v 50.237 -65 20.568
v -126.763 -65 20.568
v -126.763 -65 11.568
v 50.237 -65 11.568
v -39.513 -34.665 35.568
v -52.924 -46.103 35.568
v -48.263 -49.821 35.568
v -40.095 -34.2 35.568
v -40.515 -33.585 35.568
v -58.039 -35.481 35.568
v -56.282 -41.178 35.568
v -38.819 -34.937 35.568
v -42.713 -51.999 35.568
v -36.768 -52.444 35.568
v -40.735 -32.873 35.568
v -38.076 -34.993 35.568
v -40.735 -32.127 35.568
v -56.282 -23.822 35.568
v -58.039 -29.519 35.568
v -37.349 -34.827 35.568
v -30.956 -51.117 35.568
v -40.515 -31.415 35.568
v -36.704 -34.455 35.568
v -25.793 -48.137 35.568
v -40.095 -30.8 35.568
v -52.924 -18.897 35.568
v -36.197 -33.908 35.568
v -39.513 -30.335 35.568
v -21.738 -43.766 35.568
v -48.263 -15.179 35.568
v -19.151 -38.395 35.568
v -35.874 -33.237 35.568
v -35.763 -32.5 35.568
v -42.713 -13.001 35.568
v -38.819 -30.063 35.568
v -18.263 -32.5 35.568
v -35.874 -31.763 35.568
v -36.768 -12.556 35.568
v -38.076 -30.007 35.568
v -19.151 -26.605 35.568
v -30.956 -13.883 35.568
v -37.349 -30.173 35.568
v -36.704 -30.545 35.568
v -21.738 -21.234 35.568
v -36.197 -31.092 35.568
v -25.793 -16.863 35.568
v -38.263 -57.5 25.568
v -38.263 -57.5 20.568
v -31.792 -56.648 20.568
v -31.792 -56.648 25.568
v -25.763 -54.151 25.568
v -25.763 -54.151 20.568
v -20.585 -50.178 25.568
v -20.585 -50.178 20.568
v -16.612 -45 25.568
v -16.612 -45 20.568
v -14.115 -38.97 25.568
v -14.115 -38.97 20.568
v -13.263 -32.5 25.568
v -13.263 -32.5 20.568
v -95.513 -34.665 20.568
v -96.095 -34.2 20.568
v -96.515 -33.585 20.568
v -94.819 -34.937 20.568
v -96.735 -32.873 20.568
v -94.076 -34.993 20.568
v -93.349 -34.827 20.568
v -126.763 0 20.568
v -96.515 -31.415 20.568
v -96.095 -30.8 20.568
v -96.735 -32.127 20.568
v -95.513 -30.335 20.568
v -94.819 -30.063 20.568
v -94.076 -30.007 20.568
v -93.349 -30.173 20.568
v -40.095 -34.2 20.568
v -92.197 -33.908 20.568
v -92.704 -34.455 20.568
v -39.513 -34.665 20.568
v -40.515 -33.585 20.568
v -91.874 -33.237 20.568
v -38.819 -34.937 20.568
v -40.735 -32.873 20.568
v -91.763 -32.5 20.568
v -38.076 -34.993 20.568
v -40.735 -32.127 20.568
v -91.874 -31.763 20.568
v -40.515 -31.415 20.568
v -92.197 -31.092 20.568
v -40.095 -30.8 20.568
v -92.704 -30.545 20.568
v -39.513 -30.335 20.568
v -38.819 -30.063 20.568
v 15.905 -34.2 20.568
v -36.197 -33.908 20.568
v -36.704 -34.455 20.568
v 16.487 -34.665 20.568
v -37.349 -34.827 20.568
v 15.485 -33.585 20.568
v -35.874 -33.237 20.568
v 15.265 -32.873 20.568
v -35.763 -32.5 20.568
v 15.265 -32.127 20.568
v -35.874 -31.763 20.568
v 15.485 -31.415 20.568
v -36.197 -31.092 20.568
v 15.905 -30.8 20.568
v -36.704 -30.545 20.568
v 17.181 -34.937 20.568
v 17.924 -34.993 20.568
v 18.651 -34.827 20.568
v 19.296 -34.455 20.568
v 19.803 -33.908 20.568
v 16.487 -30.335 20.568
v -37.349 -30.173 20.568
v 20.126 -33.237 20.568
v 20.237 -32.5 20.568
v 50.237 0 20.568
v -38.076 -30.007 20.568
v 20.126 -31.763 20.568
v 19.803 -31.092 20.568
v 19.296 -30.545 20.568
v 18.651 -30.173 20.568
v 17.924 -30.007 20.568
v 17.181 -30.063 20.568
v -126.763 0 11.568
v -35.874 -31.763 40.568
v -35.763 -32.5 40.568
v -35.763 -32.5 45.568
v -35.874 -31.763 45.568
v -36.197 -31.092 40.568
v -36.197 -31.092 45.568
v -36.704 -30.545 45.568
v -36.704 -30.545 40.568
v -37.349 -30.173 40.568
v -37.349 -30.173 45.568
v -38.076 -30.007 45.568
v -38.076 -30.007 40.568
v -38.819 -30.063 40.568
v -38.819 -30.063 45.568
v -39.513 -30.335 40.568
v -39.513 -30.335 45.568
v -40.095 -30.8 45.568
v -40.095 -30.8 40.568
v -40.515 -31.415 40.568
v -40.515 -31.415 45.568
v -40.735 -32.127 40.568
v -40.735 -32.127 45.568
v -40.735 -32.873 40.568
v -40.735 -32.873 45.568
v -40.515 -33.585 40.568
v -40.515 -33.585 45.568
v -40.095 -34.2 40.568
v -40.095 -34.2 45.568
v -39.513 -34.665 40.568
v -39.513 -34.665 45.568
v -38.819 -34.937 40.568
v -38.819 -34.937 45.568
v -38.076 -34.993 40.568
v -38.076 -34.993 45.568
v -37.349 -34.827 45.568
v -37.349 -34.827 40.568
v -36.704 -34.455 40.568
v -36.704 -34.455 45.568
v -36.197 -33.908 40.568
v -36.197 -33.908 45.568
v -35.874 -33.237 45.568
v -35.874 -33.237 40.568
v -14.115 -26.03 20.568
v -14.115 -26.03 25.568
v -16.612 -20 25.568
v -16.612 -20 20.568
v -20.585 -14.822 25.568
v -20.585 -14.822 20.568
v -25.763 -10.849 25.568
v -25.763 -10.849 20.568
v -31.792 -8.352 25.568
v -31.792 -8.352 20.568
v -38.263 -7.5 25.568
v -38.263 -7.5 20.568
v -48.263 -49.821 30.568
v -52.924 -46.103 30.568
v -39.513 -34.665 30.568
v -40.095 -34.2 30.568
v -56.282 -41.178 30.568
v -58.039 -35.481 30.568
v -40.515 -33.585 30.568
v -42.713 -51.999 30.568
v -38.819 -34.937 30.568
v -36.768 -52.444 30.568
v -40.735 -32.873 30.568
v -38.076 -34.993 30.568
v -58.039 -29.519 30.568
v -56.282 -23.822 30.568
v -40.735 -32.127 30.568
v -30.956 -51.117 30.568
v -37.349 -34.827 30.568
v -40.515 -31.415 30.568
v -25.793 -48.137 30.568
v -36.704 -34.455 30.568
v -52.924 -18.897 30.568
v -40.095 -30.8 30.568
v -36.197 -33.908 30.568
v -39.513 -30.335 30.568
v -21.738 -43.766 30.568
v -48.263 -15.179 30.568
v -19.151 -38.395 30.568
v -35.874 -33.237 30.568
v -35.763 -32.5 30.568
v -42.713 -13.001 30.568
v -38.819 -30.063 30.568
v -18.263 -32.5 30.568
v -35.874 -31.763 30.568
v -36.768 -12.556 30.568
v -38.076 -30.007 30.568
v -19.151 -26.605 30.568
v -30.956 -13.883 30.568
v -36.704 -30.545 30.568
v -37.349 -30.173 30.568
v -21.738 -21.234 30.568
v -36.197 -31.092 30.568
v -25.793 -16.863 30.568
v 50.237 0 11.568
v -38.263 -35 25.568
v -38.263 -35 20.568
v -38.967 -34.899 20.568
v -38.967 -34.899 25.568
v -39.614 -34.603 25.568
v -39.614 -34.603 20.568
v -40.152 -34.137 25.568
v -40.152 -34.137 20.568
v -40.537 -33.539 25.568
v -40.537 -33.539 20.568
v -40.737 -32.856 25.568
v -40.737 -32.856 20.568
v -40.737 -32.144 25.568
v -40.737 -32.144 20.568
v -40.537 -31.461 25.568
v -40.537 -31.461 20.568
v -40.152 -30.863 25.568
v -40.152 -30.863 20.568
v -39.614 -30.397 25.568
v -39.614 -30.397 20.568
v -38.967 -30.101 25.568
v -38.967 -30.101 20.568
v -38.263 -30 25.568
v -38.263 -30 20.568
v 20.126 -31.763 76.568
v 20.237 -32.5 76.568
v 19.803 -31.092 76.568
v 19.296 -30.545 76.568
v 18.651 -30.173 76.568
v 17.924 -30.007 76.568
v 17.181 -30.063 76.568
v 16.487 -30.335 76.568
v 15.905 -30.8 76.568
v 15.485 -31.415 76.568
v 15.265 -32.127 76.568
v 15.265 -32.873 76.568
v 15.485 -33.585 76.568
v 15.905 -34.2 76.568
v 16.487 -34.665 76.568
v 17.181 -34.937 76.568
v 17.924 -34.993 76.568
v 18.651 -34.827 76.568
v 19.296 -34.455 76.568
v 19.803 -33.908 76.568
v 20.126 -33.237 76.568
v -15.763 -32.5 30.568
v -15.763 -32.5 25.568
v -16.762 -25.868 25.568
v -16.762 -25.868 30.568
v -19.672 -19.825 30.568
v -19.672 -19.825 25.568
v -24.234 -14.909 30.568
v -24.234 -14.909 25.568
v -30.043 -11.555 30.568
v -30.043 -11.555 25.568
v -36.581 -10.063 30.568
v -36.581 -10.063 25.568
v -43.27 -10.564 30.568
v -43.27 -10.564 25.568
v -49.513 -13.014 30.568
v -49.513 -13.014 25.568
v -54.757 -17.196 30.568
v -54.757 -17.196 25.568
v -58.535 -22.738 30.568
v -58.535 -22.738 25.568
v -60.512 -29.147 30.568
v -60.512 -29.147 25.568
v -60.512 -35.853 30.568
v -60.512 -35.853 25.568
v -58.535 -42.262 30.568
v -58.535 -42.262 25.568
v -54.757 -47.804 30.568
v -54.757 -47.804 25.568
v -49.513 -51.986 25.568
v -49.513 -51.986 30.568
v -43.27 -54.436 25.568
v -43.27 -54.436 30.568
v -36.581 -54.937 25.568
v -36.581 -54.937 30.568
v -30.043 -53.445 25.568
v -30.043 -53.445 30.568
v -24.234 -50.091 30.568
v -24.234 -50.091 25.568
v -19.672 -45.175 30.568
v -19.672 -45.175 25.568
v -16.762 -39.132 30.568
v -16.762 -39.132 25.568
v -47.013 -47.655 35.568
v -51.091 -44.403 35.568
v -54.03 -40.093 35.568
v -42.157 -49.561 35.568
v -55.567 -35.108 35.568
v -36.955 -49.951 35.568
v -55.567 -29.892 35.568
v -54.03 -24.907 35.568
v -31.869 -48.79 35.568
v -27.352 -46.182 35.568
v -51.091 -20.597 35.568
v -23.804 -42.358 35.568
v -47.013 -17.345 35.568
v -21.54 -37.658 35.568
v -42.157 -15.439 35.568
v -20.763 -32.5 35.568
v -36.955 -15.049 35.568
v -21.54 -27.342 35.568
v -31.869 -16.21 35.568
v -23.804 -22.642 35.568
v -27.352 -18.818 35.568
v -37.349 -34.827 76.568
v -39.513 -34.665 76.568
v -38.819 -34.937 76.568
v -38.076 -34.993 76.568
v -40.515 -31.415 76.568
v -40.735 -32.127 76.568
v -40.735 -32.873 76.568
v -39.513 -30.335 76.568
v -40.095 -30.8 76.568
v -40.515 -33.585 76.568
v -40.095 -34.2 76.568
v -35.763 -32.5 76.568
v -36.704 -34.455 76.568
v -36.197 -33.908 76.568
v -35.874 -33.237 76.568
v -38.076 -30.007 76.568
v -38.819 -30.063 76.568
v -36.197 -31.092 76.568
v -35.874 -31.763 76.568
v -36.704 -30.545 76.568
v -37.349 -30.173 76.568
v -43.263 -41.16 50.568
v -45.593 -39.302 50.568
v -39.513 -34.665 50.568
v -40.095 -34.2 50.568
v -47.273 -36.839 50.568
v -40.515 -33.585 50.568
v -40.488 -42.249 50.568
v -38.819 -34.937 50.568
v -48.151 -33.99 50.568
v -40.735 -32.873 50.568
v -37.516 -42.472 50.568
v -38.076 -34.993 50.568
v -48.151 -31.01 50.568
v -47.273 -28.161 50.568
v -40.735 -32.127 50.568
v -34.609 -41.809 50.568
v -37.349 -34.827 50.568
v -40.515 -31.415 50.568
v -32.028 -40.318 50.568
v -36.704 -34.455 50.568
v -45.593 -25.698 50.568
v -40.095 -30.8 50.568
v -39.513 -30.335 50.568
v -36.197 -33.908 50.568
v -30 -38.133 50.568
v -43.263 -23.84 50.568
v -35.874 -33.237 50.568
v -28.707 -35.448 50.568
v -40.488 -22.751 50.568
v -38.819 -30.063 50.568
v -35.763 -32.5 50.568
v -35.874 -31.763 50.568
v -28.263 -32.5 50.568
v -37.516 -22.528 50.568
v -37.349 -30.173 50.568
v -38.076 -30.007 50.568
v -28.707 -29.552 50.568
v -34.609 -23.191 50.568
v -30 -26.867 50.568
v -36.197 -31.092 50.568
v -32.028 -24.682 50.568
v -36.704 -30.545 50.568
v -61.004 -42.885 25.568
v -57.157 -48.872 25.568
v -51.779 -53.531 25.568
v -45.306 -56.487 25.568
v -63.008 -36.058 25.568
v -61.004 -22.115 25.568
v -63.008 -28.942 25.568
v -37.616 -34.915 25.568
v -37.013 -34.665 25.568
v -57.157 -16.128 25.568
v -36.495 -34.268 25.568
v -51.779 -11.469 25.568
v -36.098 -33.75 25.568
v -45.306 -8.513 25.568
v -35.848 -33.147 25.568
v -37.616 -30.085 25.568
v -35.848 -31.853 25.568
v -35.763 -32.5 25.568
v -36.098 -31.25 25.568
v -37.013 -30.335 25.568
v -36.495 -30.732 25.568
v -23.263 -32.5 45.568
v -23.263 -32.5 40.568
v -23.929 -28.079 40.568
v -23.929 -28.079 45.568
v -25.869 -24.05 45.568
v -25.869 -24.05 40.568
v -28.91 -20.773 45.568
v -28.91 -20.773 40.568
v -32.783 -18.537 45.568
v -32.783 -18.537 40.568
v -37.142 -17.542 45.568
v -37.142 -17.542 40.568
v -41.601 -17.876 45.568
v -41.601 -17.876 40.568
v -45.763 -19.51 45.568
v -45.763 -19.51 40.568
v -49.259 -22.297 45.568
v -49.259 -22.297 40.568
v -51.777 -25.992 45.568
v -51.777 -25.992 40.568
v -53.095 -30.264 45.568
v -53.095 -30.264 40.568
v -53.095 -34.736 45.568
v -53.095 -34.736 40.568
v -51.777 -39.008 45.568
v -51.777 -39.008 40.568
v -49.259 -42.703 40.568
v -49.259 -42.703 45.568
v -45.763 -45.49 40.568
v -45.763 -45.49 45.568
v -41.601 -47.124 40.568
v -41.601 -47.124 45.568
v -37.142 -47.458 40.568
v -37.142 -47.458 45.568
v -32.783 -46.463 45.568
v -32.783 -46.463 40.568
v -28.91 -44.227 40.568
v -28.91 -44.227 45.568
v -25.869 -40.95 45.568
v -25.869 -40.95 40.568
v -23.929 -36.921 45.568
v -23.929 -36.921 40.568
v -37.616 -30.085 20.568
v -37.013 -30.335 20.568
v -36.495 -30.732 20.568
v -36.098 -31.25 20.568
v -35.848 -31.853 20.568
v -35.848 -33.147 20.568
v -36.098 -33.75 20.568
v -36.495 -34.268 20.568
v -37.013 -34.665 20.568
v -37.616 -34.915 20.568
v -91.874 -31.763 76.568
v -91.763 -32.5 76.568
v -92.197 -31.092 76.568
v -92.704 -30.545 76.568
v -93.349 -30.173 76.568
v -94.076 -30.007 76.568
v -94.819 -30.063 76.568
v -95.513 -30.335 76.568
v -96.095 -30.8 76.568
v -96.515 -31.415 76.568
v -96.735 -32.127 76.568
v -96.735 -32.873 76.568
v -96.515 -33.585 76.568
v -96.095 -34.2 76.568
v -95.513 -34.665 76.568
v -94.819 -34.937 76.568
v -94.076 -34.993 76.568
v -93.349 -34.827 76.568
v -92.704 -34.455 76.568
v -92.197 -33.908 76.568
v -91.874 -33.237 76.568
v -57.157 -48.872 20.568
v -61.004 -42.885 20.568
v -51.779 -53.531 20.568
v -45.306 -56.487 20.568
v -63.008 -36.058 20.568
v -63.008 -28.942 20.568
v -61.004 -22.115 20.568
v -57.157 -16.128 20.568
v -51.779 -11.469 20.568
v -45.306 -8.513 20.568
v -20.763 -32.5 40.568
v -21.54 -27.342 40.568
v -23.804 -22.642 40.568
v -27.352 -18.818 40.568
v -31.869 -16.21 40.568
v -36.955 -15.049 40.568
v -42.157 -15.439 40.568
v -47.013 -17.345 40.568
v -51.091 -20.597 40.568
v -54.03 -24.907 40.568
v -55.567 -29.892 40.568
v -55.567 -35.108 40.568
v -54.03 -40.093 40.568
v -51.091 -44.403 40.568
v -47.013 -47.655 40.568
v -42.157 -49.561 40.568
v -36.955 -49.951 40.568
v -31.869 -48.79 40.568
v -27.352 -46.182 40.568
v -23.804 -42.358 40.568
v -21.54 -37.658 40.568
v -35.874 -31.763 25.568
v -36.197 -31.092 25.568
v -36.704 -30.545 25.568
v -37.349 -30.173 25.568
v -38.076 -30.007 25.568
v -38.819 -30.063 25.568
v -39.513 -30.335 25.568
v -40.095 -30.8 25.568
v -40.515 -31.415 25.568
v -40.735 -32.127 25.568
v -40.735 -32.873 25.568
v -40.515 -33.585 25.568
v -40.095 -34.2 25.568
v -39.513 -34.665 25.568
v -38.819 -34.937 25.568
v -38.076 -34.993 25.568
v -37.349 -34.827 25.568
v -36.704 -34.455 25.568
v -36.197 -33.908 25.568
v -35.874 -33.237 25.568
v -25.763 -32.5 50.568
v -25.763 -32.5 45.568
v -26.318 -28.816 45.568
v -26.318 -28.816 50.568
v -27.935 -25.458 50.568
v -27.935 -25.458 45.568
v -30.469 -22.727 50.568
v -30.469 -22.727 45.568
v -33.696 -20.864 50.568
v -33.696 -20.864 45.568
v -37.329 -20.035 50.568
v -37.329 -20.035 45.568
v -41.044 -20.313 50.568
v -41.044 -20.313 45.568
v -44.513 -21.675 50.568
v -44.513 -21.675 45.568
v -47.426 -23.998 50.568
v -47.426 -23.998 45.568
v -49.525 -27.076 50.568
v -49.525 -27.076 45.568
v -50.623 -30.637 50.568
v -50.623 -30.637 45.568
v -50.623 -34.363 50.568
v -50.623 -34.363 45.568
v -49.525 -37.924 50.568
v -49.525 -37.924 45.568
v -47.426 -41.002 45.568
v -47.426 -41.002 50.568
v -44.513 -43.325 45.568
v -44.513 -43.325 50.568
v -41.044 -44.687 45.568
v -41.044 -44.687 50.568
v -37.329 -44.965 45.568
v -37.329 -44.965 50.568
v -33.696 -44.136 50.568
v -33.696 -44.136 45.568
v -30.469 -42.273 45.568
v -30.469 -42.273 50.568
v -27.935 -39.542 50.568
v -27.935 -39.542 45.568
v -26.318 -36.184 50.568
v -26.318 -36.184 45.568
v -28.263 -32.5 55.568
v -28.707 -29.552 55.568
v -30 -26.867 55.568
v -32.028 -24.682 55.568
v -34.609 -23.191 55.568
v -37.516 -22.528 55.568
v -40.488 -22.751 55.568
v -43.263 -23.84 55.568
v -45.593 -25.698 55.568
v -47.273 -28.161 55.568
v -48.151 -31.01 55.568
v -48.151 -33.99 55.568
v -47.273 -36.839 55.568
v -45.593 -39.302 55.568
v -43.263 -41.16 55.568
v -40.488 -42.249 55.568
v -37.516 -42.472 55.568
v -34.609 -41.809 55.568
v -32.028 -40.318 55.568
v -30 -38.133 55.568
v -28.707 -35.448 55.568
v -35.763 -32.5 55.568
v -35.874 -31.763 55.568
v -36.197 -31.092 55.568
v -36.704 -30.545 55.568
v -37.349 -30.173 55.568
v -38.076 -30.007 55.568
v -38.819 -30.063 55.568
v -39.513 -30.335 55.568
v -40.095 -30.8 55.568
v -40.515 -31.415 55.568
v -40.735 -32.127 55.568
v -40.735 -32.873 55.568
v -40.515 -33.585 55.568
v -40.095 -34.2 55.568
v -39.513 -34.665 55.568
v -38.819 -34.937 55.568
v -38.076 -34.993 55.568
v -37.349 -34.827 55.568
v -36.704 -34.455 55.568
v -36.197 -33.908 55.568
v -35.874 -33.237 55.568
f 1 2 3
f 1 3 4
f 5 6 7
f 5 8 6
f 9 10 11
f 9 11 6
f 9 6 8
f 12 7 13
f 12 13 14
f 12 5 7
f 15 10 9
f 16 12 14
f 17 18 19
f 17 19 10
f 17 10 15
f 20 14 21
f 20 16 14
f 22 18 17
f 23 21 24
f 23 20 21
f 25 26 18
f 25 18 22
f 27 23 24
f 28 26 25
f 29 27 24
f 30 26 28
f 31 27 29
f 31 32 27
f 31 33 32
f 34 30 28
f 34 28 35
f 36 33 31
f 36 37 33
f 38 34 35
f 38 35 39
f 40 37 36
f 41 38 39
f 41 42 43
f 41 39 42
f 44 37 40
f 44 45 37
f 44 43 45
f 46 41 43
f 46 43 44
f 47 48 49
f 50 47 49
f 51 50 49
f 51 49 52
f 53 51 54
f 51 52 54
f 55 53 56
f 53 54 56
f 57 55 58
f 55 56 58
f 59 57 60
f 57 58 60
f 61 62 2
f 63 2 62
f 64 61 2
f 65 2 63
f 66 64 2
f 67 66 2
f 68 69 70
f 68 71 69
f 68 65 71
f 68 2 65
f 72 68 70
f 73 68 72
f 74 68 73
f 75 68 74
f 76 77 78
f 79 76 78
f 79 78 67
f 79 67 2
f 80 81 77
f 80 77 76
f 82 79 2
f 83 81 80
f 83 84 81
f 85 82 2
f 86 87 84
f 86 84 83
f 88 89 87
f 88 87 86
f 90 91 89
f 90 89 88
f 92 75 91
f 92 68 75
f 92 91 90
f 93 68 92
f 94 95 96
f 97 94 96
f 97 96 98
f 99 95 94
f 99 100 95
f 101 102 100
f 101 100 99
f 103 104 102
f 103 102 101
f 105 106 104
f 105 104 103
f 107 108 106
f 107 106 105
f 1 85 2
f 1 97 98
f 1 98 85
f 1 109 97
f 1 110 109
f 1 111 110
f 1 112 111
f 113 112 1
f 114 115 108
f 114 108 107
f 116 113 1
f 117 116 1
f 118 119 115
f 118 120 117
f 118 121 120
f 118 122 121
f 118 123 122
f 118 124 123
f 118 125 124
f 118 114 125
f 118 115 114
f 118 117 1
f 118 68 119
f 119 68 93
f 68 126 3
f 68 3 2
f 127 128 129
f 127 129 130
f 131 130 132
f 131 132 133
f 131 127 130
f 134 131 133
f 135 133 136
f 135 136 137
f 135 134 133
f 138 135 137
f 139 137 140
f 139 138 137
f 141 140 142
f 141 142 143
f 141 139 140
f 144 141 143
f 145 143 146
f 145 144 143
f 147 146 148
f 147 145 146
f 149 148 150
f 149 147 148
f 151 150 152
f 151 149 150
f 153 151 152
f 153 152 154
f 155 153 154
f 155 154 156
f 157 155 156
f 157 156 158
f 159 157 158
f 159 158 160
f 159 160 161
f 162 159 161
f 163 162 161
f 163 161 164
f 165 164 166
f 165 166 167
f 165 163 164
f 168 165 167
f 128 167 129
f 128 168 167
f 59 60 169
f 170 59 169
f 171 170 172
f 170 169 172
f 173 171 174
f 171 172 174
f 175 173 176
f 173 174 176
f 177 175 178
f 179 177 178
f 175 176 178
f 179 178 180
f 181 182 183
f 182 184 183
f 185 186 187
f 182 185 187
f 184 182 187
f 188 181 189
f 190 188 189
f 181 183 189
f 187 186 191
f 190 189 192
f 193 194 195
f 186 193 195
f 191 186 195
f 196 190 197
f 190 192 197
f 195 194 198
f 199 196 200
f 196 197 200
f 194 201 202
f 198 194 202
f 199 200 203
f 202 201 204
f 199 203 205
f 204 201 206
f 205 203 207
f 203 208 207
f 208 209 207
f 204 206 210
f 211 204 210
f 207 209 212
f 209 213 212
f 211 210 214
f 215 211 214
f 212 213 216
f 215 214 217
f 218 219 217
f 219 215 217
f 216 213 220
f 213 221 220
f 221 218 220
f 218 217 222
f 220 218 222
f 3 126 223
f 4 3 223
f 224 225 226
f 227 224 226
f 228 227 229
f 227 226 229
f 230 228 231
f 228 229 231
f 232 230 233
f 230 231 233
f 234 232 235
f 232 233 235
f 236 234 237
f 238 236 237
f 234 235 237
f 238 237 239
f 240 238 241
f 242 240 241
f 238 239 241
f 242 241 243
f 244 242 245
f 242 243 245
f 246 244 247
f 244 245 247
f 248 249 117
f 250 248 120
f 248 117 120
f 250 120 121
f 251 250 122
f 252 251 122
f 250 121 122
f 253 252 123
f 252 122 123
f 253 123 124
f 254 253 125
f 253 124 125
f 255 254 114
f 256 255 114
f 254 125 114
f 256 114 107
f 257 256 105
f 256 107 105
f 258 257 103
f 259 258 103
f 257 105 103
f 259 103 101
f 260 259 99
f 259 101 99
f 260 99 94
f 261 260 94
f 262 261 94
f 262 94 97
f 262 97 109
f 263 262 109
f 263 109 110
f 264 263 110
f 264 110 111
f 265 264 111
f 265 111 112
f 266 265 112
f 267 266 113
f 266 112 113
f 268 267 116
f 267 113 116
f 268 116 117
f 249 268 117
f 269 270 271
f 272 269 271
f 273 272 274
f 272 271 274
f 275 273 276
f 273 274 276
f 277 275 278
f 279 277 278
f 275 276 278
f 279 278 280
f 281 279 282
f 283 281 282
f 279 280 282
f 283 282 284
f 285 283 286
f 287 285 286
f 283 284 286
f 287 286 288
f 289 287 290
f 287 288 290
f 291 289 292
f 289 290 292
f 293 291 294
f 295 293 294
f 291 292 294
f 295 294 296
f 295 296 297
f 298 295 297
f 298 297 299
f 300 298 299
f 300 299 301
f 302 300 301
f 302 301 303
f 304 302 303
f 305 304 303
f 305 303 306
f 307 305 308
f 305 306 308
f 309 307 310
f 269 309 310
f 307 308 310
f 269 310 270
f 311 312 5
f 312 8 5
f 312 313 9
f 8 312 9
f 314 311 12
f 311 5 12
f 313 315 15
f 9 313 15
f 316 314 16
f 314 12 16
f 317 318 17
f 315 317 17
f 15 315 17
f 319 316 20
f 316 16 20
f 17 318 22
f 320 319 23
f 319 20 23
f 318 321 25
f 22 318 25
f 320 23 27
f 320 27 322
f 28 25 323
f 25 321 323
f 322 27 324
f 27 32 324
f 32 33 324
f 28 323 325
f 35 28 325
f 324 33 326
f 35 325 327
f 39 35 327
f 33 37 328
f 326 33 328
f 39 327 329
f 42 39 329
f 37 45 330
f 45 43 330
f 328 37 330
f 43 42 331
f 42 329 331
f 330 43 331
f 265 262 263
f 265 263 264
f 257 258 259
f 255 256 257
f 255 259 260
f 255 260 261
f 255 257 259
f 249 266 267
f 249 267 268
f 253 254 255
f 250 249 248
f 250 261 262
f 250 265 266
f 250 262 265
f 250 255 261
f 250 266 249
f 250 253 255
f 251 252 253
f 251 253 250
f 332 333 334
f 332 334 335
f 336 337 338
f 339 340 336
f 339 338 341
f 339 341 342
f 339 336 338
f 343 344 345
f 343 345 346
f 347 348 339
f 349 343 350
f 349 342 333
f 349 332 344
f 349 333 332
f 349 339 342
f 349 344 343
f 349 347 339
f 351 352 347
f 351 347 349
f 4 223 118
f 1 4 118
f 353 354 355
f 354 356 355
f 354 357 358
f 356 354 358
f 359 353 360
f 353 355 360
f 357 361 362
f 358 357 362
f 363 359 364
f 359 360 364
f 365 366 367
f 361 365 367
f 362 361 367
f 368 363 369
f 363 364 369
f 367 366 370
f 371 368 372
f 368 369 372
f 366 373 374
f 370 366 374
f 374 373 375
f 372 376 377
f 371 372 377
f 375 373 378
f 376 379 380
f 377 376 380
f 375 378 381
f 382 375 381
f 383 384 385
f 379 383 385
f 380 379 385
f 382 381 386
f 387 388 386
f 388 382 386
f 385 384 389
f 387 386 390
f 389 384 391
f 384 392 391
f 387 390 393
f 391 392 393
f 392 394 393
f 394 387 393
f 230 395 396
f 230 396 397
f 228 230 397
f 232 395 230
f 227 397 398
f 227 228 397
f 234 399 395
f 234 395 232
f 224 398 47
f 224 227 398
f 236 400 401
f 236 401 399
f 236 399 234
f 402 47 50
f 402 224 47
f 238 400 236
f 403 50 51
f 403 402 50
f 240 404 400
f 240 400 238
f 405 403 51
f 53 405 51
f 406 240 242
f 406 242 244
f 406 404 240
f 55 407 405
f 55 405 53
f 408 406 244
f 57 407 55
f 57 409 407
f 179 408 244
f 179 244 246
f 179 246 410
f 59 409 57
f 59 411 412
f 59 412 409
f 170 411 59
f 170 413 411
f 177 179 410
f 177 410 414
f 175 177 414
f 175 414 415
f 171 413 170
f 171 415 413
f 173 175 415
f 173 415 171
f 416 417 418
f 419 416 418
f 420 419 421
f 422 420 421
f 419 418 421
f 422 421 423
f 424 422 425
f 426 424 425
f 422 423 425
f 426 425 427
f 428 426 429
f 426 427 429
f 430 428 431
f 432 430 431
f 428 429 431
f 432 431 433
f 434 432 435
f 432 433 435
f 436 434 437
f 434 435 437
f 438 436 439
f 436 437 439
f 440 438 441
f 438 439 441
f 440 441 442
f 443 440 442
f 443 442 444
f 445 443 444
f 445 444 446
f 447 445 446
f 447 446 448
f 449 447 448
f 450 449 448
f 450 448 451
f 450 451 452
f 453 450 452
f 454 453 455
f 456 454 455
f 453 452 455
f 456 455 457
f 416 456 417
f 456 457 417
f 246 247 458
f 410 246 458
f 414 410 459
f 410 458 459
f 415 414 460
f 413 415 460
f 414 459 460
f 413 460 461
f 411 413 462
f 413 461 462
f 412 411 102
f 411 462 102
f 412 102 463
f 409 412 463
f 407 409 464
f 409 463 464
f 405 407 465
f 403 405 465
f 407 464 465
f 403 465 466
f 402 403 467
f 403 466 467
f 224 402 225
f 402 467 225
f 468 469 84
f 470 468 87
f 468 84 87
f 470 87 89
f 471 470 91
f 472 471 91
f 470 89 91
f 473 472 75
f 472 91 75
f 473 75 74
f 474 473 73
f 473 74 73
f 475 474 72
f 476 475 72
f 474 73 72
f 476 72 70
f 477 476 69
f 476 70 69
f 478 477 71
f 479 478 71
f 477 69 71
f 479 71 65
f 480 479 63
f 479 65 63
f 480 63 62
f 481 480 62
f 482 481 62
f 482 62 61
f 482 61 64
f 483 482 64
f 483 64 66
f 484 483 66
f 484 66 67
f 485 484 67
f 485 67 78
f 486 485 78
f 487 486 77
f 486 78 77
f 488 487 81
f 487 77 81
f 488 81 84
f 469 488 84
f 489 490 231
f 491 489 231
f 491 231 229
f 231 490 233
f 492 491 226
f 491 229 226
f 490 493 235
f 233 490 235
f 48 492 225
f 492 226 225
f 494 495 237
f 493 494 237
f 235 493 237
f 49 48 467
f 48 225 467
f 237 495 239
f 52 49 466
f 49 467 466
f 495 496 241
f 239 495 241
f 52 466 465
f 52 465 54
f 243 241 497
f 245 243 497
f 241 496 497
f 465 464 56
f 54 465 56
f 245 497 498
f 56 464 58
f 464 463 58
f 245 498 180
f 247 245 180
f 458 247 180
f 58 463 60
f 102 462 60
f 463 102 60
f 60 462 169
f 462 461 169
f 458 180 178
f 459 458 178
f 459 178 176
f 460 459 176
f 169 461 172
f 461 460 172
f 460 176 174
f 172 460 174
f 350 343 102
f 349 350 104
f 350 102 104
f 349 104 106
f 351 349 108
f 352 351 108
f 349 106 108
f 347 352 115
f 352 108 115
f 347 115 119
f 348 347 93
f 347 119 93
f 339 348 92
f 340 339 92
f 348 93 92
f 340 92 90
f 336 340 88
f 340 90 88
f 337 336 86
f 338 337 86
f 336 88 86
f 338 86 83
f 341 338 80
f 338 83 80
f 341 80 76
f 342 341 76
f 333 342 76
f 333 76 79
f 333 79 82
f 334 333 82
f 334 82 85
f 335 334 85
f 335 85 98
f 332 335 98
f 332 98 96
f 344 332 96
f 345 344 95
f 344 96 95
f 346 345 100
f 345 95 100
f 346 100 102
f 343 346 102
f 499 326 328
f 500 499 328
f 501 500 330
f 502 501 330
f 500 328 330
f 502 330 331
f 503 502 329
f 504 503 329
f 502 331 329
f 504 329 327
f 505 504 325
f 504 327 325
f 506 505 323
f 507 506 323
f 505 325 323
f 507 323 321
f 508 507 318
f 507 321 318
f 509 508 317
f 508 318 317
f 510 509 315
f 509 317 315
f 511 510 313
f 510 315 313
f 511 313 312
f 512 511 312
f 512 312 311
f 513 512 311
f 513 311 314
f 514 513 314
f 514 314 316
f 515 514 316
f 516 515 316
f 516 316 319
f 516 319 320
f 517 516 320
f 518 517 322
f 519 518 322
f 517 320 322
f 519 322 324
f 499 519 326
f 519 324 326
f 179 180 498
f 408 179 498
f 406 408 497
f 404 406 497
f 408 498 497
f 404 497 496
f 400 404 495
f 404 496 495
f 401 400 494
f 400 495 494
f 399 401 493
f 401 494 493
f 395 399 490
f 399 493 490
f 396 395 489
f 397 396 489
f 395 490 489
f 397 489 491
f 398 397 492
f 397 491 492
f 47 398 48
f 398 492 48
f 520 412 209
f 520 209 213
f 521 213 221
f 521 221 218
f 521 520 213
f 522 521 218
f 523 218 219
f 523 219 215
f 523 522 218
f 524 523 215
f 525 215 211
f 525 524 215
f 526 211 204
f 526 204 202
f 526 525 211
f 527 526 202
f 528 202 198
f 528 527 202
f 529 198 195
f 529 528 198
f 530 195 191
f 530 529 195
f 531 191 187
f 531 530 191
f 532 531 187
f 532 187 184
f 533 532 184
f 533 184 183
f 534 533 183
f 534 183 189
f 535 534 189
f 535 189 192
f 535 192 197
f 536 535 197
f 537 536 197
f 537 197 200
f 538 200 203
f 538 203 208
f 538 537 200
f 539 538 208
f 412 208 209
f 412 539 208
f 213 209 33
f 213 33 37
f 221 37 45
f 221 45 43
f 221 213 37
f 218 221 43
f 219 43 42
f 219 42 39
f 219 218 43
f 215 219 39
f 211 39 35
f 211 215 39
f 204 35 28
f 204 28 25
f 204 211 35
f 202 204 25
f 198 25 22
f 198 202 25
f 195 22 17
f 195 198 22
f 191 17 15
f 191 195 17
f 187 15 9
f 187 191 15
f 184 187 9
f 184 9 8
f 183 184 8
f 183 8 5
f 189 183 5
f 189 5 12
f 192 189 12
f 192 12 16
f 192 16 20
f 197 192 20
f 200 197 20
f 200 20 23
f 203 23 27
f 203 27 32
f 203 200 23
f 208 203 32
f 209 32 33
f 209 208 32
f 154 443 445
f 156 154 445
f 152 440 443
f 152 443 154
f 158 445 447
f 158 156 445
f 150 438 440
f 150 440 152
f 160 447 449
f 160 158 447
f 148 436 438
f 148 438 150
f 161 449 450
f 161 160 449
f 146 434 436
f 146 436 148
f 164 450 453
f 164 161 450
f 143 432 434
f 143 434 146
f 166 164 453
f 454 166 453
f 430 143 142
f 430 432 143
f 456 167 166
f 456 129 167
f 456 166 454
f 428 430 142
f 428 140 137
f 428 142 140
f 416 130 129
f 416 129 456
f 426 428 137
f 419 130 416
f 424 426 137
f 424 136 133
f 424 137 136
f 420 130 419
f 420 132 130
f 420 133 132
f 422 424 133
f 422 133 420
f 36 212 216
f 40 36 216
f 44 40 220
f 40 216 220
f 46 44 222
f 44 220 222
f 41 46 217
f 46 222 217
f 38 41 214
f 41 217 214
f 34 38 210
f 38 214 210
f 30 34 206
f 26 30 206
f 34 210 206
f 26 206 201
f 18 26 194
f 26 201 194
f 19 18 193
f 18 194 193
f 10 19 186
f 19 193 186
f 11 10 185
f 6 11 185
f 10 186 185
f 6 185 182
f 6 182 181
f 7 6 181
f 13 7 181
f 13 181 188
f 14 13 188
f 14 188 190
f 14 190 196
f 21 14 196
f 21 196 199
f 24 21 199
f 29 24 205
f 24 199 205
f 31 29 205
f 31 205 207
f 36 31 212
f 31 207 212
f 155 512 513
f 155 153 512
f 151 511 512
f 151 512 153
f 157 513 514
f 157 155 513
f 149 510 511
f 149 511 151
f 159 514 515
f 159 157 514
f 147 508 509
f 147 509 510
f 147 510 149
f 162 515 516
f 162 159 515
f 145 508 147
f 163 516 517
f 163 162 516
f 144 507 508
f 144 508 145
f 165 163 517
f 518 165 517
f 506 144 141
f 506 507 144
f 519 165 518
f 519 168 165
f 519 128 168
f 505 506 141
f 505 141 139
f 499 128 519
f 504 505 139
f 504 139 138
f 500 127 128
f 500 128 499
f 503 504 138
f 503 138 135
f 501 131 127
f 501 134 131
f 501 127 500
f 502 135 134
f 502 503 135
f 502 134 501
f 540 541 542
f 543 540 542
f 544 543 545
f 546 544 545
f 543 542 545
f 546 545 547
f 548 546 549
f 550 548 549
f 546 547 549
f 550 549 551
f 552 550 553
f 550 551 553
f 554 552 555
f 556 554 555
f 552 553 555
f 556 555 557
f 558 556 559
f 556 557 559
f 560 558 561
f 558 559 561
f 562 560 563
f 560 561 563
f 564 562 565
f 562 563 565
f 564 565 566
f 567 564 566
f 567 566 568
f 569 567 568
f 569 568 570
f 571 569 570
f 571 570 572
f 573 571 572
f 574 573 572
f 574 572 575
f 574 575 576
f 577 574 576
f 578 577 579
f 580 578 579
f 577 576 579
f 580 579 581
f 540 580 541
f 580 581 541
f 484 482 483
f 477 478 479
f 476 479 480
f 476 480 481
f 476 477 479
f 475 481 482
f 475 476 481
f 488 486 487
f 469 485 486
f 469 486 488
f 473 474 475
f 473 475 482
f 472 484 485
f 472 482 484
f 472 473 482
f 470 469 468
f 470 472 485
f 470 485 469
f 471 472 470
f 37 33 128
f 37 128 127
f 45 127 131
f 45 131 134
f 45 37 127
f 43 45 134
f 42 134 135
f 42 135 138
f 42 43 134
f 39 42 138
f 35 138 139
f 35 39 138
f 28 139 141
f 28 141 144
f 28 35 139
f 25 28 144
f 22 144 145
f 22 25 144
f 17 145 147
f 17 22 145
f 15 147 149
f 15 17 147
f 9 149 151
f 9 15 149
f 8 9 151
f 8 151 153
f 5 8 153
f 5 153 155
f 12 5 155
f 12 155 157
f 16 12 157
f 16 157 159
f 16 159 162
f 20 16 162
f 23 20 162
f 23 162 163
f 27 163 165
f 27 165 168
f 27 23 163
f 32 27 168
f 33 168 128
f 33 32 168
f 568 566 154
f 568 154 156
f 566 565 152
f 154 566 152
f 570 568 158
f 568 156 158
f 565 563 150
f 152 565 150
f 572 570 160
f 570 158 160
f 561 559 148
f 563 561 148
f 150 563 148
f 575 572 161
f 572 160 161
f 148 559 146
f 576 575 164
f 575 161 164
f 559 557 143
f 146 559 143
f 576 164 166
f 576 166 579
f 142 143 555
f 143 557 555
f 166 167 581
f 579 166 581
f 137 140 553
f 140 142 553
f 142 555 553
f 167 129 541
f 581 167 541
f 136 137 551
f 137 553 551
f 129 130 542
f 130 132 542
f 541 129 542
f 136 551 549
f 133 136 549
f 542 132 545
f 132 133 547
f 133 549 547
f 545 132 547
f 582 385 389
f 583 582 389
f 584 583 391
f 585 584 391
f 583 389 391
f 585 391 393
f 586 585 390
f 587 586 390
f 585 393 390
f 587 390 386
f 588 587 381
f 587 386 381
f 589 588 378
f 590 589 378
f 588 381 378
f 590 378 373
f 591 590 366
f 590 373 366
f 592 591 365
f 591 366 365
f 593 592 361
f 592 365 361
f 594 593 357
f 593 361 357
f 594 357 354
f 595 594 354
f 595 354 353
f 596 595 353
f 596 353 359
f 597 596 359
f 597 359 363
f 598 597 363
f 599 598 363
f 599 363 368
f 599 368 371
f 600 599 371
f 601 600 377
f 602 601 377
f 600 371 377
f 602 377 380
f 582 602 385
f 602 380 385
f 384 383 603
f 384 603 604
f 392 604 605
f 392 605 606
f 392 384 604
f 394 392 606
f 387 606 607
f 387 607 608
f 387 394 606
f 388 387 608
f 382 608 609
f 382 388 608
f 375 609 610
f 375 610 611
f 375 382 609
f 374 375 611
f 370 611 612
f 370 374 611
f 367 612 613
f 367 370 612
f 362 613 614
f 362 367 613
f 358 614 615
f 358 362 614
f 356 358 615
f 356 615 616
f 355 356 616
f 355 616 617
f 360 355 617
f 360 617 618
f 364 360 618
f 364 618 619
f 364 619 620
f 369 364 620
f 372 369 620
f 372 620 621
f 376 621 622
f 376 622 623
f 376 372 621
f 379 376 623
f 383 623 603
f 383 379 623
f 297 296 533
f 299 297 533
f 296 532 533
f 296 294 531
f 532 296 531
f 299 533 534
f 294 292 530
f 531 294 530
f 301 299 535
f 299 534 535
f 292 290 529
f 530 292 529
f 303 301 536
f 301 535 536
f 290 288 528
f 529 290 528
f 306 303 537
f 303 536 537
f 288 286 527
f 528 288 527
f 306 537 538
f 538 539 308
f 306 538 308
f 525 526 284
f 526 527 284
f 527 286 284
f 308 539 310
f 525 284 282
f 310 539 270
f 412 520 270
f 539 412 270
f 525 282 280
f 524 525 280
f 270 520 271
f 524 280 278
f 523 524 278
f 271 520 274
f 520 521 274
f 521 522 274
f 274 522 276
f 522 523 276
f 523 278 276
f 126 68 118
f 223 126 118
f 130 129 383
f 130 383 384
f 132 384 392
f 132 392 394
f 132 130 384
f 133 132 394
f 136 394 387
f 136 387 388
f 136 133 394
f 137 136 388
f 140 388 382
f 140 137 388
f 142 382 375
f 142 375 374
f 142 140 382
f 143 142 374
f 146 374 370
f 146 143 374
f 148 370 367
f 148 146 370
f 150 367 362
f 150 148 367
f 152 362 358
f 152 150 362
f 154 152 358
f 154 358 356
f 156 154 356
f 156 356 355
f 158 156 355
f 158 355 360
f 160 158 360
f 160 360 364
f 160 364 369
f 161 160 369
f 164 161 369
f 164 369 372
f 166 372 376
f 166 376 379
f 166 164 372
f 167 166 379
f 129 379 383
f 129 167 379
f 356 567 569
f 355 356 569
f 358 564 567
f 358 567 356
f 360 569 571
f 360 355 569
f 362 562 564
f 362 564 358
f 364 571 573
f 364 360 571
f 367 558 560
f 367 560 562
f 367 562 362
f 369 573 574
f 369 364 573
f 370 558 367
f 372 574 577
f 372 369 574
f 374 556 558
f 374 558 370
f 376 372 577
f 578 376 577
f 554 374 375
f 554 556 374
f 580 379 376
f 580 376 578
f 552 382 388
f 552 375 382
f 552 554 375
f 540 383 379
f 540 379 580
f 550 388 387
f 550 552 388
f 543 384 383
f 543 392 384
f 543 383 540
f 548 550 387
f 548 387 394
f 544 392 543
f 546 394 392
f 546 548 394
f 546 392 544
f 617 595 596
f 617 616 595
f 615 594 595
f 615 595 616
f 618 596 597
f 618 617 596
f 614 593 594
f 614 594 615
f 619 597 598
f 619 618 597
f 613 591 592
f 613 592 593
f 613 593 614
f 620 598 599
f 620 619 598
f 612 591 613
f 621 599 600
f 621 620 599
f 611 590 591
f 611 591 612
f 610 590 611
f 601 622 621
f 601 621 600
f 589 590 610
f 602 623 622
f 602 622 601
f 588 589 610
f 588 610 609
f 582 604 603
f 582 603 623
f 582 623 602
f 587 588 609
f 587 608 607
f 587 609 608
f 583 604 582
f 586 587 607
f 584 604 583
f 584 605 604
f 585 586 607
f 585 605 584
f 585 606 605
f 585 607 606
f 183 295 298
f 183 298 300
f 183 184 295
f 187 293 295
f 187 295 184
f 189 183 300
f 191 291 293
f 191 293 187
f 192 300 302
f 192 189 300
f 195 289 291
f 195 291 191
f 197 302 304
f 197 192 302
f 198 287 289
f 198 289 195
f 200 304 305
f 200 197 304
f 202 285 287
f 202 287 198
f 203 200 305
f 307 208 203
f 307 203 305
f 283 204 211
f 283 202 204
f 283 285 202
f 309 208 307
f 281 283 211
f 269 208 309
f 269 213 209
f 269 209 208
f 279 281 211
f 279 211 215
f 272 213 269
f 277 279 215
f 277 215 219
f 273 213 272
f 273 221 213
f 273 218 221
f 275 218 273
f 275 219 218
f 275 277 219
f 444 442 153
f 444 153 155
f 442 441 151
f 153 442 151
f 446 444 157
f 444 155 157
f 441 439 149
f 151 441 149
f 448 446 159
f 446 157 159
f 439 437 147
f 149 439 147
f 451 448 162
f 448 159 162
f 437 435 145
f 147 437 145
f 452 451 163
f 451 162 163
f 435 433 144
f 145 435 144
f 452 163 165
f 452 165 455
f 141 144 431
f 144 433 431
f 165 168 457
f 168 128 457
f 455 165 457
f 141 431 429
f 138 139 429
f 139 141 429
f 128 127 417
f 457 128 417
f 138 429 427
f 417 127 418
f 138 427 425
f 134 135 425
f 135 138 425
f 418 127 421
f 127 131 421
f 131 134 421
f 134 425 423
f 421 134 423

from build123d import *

# Parameters (mm, degrees)
F0_W      = 177
F0_H      = 9
F1_DEPTH  = 65
F3_DEPTH  = 56
F5_DEPTH  = 5
F6_R      = 22.5
F6_R_2    = 2.5
F7_DEPTH  = 5
F8_R      = 20
F8_R_2    = 2.5
F9_DEPTH  = 5
F10_R     = 17.5
F10_R_2   = 2.5
F11_DEPTH = 5
F12_R     = 15
F12_R_2   = 2.5
F13_DEPTH = 5
F14_R     = 12.5
F14_R_2   = 2.5
F15_DEPTH = 5
F16_R     = 10
F16_R_2   = 2.5
F17_DEPTH = 5


with BuildPart() as f1:
    # F0 (on Front) → F1 (new body)
    with BuildSketch(Plane.XZ):
        with Locations((-38.2628371716, 16.0677108988)):
            Rectangle(F0_W, F0_H)
    extrude(amount=F1_DEPTH)

    # F2 (on face) → F3 (join)
    with BuildSketch(Plane.XY.offset(20.5677108988)):
        with BuildLine():
            ThreePointArc((15.2371628284, -32.5), (17.7371628284, -35), (20.2371628284, -32.5))
            Line((20.2371628284, -32.5), (17.7371628284, -32.5))
            Line((17.7371628284, -32.5), (15.2371628284, -32.5))
        make_face()
        with BuildLine():
            Line((17.7371628284, -32.5), (20.2371628284, -32.5))
            ThreePointArc((20.2371628284, -32.5), (17.7371628284, -30), (15.2371628284, -32.5))
            Line((15.2371628284, -32.5), (17.7371628284, -32.5))
        make_face()
        with BuildLine():
            Line((-35.7628371716, -32.5), (-38.2628371716, -32.5))
            Line((-38.2628371716, -32.5), (-40.7628371716, -32.5))
            ThreePointArc((-40.7628371716, -32.5), (-38.2628371716, -35), (-35.7628371716, -32.5))
        make_face()
        with BuildLine():
            Line((-40.7628371716, -32.5), (-38.2628371716, -32.5))
            Line((-38.2628371716, -32.5), (-35.7628371716, -32.5))
            ThreePointArc((-35.7628371716, -32.5), (-38.2628371716, -30), (-40.7628371716, -32.5))
        make_face()
        with BuildLine():
            Line((-91.7628371716, -32.5), (-94.2628371716, -32.5))
            Line((-94.2628371716, -32.5), (-96.7628371716, -32.5))
            ThreePointArc((-96.7628371716, -32.5), (-94.2628371716, -35), (-91.7628371716, -32.5))
        make_face()
        with BuildLine():
            Line((-96.7628371716, -32.5), (-94.2628371716, -32.5))
            Line((-94.2628371716, -32.5), (-91.7628371716, -32.5))
            ThreePointArc((-91.7628371716, -32.5), (-94.2628371716, -30), (-96.7628371716, -32.5))
        make_face()
    extrude(amount=F3_DEPTH)


with BuildPart() as f5:
    # F4 (on face) → F5 (new body)
    with BuildSketch(Plane.XY.offset(20.5677108988)):
        with BuildLine():
            Line((-38.2628371716, -30), (-38.2628371716, -7.5))
            ThreePointArc((-38.2628371716, -7.5), (-63.2628371716, -32.5), (-38.2628371716, -57.5))
            Line((-38.2628371716, -57.5), (-38.2628371716, -35))
            ThreePointArc((-38.2628371716, -35), (-40.7628371716, -32.5), (-38.2628371716, -30))
        make_face()
        with BuildLine():
            ThreePointArc((-38.2628371716, -57.5), (-20.5851676419, -50.1776695297), (-13.2628371716, -32.5))
            ThreePointArc((-13.2628371716, -32.5), (-20.5851676419, -14.8223304703), (-38.2628371716, -7.5))
            Line((-38.2628371716, -7.5), (-38.2628371716, -30))
            ThreePointArc((-38.2628371716, -30), (-36.4950702186, -30.732233047), (-35.7628371716, -32.5))
            ThreePointArc((-35.7628371716, -32.5), (-36.4950702186, -34.267766953), (-38.2628371716, -35))
            Line((-38.2628371716, -35), (-38.2628371716, -57.5))
        make_face()
    extrude(amount=F5_DEPTH)


with BuildPart() as f7:
    # F6 (on face) → F7 (new body)
    with BuildSketch(Plane.XY.offset(25.5677108988)):
        with Locations((-38.2628371716, -32.5)):
            Circle(F6_R)
        with Locations((-38.2628371716, -32.5)):
            Circle(F6_R_2, mode=Mode.SUBTRACT)
    extrude(amount=F7_DEPTH)


with BuildPart() as f9:
    # F8 (on face) → F9 (new body)
    with BuildSketch(Plane.XY.offset(30.5677108988)):
        with Locations((-38.2628371716, -32.5)):
            Circle(F8_R)
        with Locations((-38.2628371716, -32.5)):
            Circle(F8_R_2, mode=Mode.SUBTRACT)
    extrude(amount=F9_DEPTH)


with BuildPart() as f11:
    # F10 (on face) → F11 (new body)
    with BuildSketch(Plane.XY.offset(35.5677108988)):
        with Locations((-38.2628371716, -32.5)):
            Circle(F10_R)
        with Locations((-38.2628371716, -32.5)):
            Circle(F10_R_2, mode=Mode.SUBTRACT)
    extrude(amount=F11_DEPTH)


with BuildPart() as f13:
    # F12 (on face) → F13 (new body)
    with BuildSketch(Plane.XY.offset(40.5677108988)):
        with Locations((-38.2628371716, -32.5)):
            Circle(F12_R)
        with Locations((-38.2628371716, -32.5)):
            Circle(F12_R_2, mode=Mode.SUBTRACT)
    extrude(amount=F13_DEPTH)


with BuildPart() as f15:
    # F14 (on face) → F15 (new body)
    with BuildSketch(Plane.XY.offset(45.5677108988)):
        with Locations((-38.2628371716, -32.5)):
            Circle(F14_R)
        with Locations((-38.2628371716, -32.5)):
            Circle(F14_R_2, mode=Mode.SUBTRACT)
    extrude(amount=F15_DEPTH)


with BuildPart() as f17:
    # F16 (on face) → F17 (new body)
    with BuildSketch(Plane.XY.offset(50.5677108988)):
        with Locations((-38.2628371716, -32.5)):
            Circle(F16_R)
        with Locations((-38.2628371716, -32.5)):
            Circle(F16_R_2, mode=Mode.SUBTRACT)
    extrude(amount=F17_DEPTH)


solid = Compound([f1.part, f5.part, f7.part, f9.part, f11.part, f13.part, f15.part, f17.part])
